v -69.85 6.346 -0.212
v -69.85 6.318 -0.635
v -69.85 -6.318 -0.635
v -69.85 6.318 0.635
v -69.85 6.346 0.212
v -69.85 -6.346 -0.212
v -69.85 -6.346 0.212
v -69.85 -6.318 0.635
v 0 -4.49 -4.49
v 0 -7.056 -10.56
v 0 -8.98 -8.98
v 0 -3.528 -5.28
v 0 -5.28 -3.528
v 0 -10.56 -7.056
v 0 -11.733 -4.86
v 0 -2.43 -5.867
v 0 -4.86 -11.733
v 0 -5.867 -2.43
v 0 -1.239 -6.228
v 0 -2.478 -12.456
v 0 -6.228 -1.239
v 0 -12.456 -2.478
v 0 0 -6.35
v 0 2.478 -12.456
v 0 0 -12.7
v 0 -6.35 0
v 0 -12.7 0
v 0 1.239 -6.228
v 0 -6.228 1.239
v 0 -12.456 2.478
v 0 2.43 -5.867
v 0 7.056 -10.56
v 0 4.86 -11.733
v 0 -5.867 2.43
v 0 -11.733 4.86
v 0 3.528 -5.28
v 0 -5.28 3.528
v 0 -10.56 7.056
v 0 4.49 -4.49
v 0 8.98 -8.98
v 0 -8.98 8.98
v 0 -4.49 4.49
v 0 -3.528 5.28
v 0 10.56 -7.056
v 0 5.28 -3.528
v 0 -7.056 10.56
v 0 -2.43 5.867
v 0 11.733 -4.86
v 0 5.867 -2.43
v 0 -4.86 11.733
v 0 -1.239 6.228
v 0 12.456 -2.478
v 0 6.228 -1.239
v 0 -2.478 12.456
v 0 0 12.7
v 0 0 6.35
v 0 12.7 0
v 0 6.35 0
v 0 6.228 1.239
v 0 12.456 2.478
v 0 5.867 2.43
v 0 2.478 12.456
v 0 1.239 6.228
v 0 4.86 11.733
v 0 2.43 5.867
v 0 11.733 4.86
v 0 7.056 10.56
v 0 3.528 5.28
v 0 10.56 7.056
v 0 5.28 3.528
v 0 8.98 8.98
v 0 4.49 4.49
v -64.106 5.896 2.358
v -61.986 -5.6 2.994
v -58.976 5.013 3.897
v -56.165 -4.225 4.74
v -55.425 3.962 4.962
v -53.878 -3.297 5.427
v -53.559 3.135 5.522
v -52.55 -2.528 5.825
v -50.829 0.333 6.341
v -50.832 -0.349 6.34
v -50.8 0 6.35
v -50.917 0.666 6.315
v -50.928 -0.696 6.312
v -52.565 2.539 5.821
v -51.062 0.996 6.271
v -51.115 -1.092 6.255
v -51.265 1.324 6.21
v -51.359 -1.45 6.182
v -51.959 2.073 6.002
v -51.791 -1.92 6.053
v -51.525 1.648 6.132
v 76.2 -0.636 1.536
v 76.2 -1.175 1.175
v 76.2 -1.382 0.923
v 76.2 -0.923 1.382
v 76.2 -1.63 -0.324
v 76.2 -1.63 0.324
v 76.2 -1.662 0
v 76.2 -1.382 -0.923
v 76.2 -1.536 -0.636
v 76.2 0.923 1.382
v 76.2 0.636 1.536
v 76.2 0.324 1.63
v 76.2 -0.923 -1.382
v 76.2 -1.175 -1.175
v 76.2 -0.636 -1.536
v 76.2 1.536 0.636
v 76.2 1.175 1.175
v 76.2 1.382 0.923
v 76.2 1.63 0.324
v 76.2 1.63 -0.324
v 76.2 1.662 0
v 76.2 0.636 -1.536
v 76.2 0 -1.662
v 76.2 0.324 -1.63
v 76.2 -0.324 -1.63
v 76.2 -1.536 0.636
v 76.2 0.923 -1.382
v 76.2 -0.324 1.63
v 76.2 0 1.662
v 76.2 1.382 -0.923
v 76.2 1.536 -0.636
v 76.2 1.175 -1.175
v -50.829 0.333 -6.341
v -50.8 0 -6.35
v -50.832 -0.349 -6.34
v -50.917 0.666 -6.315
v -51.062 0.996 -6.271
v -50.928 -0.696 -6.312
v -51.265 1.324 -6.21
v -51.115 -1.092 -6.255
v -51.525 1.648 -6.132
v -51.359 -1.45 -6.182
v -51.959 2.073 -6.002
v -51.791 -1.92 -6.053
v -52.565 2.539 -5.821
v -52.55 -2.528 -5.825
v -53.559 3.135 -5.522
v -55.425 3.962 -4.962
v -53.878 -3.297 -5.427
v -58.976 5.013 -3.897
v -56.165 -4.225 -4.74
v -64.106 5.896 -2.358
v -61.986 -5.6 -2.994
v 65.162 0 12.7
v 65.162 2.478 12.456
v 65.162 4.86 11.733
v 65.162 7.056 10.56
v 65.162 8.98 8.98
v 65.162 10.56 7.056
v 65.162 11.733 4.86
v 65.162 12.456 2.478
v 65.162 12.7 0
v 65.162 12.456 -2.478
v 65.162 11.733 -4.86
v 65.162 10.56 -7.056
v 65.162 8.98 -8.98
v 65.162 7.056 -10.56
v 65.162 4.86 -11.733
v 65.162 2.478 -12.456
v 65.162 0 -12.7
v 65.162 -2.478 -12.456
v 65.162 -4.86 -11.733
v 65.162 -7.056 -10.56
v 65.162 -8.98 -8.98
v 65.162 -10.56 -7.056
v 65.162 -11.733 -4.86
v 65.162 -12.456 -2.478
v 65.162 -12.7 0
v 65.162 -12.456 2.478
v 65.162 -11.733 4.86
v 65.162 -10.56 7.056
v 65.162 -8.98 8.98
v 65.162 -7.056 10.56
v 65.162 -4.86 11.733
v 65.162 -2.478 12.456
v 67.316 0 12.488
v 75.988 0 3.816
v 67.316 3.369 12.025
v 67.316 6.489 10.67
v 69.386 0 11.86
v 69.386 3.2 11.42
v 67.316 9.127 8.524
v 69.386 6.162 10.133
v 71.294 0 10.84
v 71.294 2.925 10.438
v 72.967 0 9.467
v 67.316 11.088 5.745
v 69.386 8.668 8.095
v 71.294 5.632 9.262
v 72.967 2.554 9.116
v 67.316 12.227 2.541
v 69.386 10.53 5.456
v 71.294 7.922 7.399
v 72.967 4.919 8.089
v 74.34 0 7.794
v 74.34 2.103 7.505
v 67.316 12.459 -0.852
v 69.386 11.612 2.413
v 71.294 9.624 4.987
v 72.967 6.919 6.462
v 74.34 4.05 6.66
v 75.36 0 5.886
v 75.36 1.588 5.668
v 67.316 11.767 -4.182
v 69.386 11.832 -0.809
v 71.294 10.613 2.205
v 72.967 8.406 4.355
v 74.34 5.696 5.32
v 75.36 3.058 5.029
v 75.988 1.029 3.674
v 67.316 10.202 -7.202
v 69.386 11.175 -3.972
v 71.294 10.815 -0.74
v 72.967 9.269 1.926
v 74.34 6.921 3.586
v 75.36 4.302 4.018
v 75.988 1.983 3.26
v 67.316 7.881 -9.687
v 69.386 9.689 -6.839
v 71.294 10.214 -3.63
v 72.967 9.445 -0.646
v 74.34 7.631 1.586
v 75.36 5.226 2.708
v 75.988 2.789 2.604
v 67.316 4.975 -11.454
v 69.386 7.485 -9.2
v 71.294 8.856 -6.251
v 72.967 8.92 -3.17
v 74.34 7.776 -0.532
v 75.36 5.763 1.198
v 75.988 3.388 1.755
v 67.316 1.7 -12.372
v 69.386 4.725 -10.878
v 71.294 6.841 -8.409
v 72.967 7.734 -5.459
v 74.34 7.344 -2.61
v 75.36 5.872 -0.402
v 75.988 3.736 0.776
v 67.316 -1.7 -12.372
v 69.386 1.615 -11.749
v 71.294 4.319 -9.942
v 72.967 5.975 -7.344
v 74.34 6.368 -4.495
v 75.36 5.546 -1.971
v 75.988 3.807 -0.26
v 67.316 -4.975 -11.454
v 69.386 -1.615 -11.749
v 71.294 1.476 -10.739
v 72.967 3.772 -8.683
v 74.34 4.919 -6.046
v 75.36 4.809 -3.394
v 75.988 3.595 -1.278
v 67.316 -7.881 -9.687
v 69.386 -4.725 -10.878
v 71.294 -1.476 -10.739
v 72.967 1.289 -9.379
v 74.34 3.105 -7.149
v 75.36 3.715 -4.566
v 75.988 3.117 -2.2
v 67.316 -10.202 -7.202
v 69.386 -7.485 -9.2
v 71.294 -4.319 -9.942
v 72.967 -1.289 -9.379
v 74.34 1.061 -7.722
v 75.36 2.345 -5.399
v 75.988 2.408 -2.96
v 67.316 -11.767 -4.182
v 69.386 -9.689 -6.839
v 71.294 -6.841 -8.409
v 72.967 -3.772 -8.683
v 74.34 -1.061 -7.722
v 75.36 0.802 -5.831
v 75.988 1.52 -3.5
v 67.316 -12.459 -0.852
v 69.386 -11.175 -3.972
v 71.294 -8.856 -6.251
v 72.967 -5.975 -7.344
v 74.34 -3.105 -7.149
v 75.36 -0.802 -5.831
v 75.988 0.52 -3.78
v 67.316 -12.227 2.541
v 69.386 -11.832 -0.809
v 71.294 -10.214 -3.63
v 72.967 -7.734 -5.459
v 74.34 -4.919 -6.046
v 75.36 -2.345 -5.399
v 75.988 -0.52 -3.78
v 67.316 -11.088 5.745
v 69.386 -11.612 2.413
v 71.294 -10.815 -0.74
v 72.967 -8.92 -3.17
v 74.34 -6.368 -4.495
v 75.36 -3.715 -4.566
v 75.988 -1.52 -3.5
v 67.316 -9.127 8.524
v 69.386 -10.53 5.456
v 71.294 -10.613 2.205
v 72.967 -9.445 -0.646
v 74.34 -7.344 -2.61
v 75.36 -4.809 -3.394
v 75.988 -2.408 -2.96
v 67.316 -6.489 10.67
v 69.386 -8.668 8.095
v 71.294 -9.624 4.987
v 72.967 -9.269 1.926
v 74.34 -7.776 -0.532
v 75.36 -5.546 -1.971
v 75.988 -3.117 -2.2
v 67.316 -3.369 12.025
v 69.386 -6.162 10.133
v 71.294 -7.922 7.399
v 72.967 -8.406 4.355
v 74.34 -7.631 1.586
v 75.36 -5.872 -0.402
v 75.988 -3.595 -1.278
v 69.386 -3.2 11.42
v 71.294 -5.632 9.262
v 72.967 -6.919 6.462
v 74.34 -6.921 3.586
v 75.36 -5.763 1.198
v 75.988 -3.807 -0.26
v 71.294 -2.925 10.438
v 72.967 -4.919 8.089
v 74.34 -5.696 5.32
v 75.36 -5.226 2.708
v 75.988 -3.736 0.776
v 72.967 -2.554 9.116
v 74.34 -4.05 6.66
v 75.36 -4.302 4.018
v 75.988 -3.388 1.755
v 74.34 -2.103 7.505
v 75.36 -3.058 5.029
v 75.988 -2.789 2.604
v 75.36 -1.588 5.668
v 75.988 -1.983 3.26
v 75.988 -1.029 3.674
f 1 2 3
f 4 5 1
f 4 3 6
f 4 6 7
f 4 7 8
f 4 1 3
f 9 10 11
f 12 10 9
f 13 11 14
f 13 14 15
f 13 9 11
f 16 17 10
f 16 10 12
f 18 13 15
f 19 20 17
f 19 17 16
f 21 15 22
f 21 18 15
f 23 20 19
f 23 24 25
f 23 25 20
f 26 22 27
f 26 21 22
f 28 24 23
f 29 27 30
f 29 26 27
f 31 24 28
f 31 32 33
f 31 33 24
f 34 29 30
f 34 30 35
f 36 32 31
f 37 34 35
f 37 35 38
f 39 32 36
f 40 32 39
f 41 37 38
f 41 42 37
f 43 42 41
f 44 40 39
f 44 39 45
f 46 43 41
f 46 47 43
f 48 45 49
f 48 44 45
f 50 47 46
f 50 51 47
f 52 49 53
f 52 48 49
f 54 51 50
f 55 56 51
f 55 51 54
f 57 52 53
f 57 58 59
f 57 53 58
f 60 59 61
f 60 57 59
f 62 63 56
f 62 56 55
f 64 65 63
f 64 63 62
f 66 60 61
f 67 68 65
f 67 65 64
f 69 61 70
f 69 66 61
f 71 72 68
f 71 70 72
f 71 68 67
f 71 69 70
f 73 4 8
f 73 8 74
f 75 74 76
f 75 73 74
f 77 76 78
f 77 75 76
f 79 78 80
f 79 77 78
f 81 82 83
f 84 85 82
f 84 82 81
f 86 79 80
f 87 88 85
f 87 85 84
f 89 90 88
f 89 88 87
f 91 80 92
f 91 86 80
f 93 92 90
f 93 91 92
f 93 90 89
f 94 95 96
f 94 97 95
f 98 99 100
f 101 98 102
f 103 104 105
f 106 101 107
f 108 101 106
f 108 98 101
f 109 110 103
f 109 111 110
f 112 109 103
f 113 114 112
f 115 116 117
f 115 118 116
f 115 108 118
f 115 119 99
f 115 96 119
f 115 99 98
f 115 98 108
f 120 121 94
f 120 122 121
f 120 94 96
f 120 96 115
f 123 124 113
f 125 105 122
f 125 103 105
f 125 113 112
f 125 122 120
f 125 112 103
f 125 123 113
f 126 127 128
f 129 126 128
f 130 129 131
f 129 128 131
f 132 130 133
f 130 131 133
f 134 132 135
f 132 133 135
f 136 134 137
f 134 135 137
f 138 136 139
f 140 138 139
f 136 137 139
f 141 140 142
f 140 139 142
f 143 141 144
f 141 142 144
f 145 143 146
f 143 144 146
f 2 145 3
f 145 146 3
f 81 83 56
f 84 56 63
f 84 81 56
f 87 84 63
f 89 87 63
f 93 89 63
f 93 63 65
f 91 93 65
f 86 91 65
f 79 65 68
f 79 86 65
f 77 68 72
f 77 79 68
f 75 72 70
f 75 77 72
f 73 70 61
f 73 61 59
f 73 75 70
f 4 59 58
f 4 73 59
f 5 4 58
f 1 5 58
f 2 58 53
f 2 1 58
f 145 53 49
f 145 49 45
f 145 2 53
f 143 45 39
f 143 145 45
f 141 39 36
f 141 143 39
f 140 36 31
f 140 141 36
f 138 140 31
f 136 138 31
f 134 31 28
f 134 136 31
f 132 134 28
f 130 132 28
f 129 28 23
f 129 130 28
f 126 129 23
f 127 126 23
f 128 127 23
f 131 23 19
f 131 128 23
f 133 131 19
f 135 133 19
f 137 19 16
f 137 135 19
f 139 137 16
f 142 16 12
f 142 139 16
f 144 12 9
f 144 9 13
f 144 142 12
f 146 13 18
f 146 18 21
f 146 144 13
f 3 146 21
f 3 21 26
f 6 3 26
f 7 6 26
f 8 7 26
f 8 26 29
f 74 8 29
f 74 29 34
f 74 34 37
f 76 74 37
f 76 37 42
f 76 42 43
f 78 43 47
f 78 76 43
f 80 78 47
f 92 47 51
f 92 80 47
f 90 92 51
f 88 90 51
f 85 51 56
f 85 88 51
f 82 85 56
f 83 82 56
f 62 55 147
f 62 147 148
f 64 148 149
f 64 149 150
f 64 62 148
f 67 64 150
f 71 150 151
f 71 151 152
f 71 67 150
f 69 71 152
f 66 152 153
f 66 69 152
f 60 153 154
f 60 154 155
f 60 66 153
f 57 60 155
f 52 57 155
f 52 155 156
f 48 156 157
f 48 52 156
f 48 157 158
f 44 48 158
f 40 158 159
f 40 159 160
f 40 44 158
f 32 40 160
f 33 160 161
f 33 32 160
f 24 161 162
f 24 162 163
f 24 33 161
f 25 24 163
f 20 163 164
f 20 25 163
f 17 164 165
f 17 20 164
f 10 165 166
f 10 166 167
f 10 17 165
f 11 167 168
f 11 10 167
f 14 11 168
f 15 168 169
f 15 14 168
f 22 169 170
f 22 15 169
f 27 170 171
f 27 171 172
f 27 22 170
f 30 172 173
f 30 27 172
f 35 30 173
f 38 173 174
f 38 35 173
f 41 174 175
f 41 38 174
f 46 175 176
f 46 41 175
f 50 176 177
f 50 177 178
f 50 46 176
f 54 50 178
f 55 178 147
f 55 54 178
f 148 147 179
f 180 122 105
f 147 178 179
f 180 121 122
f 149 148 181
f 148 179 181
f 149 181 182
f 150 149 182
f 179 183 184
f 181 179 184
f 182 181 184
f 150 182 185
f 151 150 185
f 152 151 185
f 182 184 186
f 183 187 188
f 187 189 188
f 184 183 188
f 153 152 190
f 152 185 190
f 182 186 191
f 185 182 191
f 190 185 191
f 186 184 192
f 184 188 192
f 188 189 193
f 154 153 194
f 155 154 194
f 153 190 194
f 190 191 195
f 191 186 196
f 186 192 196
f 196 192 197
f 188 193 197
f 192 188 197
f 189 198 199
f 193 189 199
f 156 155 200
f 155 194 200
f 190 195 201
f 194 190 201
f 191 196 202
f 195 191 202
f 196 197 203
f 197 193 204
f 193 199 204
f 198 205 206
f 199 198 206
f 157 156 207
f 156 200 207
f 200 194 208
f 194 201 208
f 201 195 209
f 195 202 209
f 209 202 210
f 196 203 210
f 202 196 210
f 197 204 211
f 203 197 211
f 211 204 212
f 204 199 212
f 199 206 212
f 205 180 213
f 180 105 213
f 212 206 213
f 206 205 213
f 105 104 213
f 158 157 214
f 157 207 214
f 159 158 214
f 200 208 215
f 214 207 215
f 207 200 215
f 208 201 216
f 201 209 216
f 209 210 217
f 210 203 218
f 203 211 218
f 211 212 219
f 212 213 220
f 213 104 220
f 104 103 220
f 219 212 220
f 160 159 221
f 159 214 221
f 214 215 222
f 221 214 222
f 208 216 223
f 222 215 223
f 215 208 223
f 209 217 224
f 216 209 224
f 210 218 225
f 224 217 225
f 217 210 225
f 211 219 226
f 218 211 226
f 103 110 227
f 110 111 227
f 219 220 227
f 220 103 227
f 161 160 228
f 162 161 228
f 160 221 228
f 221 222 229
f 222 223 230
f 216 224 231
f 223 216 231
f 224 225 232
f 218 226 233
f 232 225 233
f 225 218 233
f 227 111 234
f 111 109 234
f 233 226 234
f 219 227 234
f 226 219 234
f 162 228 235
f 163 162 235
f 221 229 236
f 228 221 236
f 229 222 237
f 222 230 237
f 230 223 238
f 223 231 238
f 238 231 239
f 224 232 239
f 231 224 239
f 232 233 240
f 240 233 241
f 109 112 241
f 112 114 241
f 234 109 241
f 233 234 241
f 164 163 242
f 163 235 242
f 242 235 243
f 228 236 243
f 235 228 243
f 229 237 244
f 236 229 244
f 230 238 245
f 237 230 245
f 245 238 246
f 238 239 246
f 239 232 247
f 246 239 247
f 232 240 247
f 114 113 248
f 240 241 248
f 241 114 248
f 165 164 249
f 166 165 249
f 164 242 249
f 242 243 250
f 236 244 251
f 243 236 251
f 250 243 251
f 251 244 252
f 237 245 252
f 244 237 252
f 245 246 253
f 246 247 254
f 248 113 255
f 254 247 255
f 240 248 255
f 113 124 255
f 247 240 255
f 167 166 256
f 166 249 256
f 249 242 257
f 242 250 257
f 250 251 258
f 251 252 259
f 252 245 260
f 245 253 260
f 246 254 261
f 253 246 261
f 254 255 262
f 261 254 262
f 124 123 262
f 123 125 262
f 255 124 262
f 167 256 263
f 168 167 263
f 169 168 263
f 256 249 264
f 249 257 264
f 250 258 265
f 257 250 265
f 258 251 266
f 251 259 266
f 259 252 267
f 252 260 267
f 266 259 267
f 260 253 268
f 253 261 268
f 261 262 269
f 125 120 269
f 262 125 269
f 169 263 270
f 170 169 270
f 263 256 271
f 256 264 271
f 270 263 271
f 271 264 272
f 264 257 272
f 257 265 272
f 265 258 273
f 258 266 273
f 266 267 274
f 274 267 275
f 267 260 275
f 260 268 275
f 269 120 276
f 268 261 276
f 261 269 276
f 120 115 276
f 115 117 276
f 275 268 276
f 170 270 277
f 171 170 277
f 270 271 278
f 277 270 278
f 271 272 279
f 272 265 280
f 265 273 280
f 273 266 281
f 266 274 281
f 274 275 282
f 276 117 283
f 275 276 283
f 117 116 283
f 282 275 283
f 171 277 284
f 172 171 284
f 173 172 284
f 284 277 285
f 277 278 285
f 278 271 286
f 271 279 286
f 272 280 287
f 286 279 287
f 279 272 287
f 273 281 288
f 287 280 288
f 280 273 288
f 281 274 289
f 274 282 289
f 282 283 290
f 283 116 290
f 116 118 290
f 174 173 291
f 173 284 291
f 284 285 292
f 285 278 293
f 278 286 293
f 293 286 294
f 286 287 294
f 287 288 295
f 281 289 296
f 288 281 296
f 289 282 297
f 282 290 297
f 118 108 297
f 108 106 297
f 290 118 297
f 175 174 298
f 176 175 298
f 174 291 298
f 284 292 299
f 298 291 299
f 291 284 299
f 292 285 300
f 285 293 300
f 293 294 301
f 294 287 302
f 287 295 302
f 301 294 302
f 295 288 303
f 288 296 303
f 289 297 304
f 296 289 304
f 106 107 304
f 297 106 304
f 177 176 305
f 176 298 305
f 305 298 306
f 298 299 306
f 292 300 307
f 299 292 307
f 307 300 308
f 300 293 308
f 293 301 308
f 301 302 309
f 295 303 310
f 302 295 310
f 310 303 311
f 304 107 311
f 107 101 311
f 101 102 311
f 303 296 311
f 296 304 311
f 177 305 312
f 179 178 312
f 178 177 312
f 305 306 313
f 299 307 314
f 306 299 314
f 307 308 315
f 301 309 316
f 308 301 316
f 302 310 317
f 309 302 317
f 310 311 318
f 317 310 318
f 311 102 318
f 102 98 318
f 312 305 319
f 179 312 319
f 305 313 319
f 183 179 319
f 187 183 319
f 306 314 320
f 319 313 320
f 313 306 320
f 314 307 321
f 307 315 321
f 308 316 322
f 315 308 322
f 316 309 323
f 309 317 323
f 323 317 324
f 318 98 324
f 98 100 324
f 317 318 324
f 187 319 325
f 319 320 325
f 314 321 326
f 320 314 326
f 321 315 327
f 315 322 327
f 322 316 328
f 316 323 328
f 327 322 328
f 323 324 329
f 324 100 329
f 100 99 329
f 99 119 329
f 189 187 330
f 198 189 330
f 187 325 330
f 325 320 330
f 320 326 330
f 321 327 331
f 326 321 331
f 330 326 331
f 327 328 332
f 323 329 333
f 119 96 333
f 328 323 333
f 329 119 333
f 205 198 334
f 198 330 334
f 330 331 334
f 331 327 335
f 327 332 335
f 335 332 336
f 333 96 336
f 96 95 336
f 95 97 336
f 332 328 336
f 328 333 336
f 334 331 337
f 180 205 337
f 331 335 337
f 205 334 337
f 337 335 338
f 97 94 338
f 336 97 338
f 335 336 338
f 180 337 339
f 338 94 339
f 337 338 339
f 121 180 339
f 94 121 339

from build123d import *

# Parameters (mm, degrees)
F0_W     = 19.05
F0_H     = 0.635
F2_DEPTH = 12.7
F3_R     = 11.037784


with BuildPart() as f1:
    # F0 (on Front) → F1 (revolve)
    with BuildSketch(Plane.XZ):
        Polygon((0, 0), (0, 6.35), (-50.8, 6.35), (-50.8, 0.635), (-50.8, 0), align=None)
        Polygon((76.2, 12.7), (0, 12.7), (0, 6.35), (0, 0), (76.2, 0), align=None)
        Polygon((-50.8, 0.635), (-50.8, 6.35), (-69.85, 0.635), align=None)
        with Locations((-60.325, 0.3175)):
            Rectangle(F0_W, F0_H)
        Polygon((-69.85, 0.635), (-50.8, 6.35), (-69.85, 6.35), align=None)
    revolve(axis=Axis((3.175, 0, 0), (-1, 0, 0)))

    # F0 (on Front) → F2 (cut, symmetric)
    with BuildSketch(Plane.XZ):
        Polygon((-69.85, 0.635), (-50.8, 6.35), (-69.85, 6.35), align=None)
        Polygon((-69.85, -6.35), (-50.8, -6.35), (-69.85, -0.635), align=None)
    extrude(amount=F2_DEPTH, both=True, mode=Mode.SUBTRACT)

    # F3
    f3_edges = [f1.edges().sort_by_distance(p)[0] for p in [
        (76.2, 0, -12.7),
    ]]
    fillet(f3_edges, radius=F3_R)


solid = f1.part
